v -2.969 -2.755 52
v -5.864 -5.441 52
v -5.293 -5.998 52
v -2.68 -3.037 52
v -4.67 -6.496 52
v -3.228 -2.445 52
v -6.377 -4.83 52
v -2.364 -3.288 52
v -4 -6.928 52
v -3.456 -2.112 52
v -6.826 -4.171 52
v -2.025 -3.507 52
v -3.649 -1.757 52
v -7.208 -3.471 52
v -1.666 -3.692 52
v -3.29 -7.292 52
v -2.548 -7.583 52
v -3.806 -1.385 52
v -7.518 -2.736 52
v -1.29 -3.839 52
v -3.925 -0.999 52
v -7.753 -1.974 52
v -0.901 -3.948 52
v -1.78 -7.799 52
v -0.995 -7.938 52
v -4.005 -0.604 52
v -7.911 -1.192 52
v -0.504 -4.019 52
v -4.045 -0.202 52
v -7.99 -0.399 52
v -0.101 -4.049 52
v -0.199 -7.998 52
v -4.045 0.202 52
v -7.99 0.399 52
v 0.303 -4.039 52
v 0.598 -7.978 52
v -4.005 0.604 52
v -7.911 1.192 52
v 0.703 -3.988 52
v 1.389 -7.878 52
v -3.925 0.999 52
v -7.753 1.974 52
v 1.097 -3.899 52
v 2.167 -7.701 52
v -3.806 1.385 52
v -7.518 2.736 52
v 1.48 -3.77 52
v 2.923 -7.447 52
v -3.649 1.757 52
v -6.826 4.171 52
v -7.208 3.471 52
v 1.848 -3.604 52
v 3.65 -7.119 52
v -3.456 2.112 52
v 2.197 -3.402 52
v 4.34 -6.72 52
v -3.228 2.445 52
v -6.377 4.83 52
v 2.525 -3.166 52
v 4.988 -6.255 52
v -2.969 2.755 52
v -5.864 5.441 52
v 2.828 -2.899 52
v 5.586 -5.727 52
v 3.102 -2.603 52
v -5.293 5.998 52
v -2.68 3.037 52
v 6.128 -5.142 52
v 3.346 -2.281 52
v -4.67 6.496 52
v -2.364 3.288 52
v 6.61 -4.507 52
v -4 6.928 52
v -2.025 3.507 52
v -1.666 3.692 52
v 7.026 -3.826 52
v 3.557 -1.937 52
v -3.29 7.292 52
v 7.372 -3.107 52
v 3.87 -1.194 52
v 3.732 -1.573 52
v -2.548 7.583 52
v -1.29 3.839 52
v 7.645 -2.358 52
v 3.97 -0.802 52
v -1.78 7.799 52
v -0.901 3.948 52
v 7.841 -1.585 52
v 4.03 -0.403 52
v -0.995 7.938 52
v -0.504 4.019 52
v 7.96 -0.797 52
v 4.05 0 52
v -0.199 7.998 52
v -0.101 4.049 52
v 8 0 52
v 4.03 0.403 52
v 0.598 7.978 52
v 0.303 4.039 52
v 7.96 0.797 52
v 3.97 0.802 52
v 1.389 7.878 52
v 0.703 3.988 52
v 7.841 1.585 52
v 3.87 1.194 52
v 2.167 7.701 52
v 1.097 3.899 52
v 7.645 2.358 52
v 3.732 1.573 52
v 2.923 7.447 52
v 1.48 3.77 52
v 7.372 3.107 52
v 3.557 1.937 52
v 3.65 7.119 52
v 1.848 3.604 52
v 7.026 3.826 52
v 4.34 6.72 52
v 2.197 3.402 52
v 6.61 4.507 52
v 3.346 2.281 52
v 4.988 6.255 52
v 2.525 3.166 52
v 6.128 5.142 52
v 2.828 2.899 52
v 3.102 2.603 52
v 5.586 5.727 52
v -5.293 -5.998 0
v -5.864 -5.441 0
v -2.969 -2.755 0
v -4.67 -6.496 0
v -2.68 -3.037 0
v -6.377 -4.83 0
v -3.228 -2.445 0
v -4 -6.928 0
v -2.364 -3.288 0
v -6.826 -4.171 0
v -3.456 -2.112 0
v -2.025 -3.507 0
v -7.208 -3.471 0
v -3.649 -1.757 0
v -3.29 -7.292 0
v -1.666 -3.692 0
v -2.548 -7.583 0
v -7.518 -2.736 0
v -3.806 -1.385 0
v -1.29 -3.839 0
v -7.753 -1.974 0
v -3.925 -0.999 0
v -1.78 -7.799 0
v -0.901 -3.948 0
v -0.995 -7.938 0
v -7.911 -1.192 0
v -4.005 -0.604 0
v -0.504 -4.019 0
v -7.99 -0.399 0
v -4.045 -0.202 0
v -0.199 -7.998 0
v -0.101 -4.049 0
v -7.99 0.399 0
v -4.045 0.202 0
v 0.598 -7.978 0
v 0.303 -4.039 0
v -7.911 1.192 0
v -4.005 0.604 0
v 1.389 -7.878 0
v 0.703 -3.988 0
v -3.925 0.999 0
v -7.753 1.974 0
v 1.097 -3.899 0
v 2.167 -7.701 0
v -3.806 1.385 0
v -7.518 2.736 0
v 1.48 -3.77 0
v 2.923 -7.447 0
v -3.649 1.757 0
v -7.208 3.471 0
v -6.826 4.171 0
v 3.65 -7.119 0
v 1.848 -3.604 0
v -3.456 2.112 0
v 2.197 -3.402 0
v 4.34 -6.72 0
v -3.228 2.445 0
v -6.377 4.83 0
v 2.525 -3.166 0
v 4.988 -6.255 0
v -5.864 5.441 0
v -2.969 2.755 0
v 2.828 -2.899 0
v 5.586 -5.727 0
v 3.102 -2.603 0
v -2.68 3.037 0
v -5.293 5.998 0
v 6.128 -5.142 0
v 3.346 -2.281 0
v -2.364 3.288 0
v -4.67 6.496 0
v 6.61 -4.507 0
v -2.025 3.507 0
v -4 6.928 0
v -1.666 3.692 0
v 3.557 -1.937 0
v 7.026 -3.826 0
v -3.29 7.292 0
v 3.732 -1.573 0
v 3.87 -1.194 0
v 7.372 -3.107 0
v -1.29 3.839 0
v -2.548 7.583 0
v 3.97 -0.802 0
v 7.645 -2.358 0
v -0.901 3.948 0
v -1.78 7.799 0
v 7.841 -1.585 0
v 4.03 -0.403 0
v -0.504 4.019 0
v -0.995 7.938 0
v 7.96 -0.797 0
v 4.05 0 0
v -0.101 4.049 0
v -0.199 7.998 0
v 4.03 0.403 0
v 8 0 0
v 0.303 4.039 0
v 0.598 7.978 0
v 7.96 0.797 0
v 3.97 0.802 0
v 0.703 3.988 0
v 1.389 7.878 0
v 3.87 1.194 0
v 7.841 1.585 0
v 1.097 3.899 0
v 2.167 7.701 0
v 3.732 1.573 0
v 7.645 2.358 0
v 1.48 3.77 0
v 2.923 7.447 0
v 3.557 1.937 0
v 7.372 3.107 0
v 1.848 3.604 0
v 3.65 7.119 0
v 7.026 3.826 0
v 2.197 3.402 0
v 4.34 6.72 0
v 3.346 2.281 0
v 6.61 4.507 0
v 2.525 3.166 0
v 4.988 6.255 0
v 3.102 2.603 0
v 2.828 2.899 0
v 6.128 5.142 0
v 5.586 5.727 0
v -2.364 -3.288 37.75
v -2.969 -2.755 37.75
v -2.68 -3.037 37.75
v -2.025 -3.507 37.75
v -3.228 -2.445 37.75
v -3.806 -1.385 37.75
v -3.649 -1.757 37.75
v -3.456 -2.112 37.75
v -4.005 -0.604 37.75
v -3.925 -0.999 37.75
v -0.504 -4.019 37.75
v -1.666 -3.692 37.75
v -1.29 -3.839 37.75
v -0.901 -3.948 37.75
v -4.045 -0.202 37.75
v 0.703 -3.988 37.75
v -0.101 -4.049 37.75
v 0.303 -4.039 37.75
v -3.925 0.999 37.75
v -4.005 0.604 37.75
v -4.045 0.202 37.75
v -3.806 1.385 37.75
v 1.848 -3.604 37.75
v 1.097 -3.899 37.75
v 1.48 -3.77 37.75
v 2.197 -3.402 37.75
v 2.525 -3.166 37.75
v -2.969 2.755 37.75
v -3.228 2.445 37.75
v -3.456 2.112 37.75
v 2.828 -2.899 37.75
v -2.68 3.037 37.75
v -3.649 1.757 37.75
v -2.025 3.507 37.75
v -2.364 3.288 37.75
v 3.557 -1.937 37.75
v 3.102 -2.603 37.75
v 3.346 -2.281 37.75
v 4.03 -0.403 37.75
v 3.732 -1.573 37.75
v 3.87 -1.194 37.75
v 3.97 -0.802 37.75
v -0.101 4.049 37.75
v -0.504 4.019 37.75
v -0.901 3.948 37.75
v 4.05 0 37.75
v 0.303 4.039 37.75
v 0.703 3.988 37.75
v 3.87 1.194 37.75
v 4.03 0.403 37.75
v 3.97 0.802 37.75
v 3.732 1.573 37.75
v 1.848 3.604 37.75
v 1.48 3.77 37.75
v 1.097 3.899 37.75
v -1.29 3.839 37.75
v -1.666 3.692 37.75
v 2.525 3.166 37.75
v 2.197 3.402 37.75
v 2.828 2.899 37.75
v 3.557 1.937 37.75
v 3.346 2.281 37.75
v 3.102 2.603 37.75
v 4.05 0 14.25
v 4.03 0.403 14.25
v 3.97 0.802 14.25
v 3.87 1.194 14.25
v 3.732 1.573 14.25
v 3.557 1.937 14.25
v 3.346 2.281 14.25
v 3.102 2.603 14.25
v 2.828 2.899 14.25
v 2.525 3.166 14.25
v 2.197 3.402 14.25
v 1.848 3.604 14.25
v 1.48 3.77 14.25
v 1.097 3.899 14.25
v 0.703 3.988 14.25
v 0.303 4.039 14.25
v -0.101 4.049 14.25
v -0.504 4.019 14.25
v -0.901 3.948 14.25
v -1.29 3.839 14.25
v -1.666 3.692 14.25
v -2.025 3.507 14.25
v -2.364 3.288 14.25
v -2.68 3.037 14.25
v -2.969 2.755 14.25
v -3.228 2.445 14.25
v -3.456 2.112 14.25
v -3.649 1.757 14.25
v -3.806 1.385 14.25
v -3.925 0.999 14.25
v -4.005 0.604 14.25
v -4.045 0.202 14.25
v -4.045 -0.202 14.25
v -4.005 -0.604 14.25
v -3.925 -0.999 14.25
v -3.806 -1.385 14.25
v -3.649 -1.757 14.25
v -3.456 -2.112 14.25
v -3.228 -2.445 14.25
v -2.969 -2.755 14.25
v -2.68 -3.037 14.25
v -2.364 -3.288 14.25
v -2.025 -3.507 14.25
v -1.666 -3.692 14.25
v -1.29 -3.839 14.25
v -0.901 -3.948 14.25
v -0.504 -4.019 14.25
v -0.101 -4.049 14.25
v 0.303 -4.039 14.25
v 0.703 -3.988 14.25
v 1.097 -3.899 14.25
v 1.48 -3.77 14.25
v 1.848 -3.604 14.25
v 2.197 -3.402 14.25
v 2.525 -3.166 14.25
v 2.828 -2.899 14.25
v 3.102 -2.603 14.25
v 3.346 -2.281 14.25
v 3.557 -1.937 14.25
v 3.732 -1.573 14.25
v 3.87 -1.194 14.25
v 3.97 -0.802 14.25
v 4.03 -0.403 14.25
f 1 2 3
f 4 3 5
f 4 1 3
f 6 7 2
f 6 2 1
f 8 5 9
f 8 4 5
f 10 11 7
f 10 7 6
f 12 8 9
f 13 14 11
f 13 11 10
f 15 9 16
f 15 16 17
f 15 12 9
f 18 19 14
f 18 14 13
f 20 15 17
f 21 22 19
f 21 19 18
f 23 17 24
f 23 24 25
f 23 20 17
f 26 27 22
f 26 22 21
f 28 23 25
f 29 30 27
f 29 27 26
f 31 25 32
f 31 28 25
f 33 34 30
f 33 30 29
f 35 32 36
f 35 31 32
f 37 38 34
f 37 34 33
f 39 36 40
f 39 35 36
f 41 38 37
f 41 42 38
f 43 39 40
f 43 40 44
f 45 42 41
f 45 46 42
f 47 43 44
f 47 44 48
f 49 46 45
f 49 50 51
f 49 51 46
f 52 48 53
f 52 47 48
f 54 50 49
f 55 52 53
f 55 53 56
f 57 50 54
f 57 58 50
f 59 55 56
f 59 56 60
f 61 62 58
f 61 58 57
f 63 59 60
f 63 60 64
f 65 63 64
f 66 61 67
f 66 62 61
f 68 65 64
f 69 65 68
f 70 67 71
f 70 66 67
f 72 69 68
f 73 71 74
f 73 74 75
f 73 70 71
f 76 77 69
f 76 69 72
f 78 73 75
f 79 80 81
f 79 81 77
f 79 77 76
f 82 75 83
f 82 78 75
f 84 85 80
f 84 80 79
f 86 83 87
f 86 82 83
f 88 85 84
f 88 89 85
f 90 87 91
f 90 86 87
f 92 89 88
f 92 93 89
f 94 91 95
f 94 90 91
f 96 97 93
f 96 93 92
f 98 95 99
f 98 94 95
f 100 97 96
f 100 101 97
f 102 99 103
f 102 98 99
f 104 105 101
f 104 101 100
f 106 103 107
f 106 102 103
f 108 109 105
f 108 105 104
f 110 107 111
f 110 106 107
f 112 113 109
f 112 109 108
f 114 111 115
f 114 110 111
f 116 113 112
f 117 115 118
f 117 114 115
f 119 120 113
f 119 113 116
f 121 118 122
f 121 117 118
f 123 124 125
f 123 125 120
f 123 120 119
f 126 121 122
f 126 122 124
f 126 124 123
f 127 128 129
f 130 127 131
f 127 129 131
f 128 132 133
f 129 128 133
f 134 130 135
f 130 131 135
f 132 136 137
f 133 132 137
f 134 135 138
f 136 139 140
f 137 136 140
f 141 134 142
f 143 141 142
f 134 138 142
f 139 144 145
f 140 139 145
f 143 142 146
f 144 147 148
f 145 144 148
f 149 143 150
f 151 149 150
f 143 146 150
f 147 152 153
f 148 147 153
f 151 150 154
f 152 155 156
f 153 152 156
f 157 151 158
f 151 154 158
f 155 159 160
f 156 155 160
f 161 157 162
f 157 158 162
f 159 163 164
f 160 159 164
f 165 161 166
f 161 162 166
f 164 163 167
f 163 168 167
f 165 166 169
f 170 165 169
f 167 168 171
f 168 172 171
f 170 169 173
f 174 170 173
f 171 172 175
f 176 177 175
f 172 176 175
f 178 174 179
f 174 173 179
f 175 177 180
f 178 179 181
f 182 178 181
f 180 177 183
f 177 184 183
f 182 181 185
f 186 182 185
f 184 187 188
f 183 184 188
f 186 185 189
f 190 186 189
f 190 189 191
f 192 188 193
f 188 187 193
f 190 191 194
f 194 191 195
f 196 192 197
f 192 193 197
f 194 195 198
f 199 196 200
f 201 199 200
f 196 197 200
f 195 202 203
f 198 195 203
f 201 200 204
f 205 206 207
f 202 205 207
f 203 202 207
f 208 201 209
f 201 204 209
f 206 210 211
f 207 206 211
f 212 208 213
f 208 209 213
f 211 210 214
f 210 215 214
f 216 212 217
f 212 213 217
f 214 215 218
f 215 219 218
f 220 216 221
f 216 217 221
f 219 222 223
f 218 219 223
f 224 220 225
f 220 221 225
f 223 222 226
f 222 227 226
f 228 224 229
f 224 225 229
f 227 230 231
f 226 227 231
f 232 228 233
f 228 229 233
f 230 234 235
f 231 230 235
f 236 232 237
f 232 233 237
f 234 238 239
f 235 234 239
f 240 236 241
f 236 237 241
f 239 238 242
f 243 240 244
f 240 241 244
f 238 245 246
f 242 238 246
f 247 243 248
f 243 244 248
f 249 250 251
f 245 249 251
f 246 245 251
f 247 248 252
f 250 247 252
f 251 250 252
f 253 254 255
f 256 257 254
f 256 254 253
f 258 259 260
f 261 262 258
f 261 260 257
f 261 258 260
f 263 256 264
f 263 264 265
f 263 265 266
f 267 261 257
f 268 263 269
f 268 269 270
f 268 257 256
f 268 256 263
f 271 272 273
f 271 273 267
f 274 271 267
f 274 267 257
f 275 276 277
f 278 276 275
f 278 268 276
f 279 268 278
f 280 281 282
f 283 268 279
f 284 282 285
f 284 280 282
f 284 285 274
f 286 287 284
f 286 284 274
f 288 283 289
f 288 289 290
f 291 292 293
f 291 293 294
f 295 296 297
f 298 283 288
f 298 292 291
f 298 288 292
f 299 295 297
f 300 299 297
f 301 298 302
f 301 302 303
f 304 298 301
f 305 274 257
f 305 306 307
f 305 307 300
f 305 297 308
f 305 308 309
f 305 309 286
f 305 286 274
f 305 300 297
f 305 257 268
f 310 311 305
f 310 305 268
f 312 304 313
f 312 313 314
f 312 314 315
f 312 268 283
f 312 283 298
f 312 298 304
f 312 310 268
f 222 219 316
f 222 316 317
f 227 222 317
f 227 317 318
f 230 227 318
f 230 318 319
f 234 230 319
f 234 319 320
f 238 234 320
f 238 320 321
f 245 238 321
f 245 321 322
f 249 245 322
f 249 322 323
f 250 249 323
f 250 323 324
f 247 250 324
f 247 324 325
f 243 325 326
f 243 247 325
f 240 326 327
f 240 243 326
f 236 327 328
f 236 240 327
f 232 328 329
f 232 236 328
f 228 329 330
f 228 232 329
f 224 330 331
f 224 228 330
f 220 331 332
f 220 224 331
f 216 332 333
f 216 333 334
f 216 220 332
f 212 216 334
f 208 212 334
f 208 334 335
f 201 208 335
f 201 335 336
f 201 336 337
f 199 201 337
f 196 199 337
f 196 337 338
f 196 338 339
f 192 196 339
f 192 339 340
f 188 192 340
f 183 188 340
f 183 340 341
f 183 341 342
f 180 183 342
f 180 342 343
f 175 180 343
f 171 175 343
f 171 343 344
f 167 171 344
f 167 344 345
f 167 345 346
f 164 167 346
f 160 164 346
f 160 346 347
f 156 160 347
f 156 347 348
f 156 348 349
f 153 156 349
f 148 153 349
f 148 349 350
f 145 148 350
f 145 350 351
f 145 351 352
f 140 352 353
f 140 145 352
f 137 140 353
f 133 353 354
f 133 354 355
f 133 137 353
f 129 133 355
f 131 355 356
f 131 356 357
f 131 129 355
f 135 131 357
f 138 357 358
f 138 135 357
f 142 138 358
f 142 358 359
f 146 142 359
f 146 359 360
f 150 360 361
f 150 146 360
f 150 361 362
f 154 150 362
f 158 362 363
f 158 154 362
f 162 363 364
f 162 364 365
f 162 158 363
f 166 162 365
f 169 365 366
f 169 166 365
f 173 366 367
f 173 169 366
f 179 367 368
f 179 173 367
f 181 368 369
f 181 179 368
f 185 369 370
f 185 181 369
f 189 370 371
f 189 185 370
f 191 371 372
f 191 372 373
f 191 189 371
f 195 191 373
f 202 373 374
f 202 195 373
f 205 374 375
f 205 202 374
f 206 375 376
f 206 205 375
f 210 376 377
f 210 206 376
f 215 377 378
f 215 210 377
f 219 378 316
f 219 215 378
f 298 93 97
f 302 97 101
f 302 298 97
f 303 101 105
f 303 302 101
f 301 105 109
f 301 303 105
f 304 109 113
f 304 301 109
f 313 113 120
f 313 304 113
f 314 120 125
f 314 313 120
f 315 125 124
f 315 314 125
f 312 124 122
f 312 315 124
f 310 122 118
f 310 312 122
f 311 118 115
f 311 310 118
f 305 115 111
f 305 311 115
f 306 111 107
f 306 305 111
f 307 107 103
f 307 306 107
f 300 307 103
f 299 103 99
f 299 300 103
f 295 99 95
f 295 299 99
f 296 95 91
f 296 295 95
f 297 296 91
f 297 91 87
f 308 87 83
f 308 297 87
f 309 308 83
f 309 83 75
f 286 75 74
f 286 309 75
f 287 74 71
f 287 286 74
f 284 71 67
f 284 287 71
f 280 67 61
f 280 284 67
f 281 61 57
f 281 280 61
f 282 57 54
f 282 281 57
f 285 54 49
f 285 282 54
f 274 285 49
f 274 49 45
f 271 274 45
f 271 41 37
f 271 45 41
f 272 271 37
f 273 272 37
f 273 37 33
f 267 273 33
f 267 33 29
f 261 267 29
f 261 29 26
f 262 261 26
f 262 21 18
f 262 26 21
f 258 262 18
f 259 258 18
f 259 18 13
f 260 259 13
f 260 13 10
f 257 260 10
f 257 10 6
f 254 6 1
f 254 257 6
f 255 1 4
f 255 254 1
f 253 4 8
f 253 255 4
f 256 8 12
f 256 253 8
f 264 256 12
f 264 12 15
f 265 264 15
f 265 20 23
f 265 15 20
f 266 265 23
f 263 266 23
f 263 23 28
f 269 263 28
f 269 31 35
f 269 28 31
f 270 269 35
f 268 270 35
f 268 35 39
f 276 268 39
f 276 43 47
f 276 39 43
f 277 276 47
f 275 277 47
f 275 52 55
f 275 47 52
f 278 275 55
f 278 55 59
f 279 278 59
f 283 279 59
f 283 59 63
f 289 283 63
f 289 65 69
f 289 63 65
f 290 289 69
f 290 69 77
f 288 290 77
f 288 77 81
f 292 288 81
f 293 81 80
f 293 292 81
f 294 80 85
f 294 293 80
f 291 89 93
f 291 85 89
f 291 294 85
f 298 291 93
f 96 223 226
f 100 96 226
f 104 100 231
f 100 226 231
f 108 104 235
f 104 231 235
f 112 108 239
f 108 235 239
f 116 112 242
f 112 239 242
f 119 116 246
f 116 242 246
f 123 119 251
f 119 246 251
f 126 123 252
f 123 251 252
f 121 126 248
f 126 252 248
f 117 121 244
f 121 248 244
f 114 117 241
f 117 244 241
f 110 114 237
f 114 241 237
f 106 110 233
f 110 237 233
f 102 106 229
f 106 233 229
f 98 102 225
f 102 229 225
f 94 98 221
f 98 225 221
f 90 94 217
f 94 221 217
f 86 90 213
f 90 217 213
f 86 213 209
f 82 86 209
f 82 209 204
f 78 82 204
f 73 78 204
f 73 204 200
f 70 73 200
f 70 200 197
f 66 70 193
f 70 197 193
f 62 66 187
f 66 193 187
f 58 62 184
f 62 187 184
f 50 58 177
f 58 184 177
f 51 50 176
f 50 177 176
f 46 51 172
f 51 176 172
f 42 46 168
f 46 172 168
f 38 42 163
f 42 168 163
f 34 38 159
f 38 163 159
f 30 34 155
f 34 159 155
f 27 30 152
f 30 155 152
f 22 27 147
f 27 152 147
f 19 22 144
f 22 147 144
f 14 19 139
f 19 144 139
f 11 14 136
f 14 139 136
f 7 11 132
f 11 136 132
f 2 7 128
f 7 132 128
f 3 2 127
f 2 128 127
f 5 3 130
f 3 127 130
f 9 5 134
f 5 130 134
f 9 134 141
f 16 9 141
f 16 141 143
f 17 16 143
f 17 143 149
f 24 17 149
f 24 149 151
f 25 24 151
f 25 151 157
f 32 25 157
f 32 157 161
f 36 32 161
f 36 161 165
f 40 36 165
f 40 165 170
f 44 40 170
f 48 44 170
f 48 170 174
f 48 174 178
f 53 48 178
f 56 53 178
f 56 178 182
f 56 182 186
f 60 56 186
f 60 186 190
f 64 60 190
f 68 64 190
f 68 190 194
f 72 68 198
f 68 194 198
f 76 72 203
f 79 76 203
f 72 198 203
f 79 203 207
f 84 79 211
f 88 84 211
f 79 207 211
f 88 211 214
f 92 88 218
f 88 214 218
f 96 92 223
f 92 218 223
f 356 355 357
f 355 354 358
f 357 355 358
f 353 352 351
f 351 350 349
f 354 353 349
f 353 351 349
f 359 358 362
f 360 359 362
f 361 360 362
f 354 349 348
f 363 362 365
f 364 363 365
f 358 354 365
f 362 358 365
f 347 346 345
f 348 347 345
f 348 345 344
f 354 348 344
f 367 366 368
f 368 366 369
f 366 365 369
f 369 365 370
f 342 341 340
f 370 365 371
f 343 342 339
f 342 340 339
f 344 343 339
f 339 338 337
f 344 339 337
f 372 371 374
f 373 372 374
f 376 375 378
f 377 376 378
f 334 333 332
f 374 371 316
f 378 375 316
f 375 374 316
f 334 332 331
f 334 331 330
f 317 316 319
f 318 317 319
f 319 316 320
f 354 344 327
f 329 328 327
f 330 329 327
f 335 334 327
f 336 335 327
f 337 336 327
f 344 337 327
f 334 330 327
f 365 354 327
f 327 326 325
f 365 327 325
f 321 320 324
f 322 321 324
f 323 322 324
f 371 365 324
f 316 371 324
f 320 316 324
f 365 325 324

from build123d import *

# Parameters (mm, degrees)
S01_SOLID_POST_BLANK_16_MM_R             = 8
F_01_SOLID_POST_BLANK_16_MM_DEPTH        = 52
F_02_START                               = -0.1
S02_REAR_M6_HEAT_SET_INSERT_SEAT_R       = 4.05
F_02_REAR_M6_HEAT_SET_INSERT_SEAT_DEPTH  = 14.35
F_03_START                               = 37.75
S03_FRONT_M6_HEAT_SET_INSERT_SEAT_R      = 4.05
F_03_FRONT_M6_HEAT_SET_INSERT_SEAT_DEPTH = 14.35


with BuildPart() as part:
    # S01 - Solid post blank - 16 mm → 01 - Solid post blank - 16 mm (new body)
    with BuildSketch(Plane.XY):
        Circle(S01_SOLID_POST_BLANK_16_MM_R)
    extrude(amount=F_01_SOLID_POST_BLANK_16_MM_DEPTH)

    # S02 - Rear M6 heat-set insert seat → 02 - Rear M6 heat-set insert seat (cut)
    with BuildSketch(Plane.XY.offset(F_02_START)):
        Circle(S02_REAR_M6_HEAT_SET_INSERT_SEAT_R)
    extrude(amount=F_02_REAR_M6_HEAT_SET_INSERT_SEAT_DEPTH, mode=Mode.SUBTRACT)

    # S03 - Front M6 heat-set insert seat → 03 - Front M6 heat-set insert seat (cut)
    with BuildSketch(Plane.XY.offset(F_03_START)):
        Circle(S03_FRONT_M6_HEAT_SET_INSERT_SEAT_R)
    extrude(amount=F_03_FRONT_M6_HEAT_SET_INSERT_SEAT_DEPTH, mode=Mode.SUBTRACT)


solid = part.part
